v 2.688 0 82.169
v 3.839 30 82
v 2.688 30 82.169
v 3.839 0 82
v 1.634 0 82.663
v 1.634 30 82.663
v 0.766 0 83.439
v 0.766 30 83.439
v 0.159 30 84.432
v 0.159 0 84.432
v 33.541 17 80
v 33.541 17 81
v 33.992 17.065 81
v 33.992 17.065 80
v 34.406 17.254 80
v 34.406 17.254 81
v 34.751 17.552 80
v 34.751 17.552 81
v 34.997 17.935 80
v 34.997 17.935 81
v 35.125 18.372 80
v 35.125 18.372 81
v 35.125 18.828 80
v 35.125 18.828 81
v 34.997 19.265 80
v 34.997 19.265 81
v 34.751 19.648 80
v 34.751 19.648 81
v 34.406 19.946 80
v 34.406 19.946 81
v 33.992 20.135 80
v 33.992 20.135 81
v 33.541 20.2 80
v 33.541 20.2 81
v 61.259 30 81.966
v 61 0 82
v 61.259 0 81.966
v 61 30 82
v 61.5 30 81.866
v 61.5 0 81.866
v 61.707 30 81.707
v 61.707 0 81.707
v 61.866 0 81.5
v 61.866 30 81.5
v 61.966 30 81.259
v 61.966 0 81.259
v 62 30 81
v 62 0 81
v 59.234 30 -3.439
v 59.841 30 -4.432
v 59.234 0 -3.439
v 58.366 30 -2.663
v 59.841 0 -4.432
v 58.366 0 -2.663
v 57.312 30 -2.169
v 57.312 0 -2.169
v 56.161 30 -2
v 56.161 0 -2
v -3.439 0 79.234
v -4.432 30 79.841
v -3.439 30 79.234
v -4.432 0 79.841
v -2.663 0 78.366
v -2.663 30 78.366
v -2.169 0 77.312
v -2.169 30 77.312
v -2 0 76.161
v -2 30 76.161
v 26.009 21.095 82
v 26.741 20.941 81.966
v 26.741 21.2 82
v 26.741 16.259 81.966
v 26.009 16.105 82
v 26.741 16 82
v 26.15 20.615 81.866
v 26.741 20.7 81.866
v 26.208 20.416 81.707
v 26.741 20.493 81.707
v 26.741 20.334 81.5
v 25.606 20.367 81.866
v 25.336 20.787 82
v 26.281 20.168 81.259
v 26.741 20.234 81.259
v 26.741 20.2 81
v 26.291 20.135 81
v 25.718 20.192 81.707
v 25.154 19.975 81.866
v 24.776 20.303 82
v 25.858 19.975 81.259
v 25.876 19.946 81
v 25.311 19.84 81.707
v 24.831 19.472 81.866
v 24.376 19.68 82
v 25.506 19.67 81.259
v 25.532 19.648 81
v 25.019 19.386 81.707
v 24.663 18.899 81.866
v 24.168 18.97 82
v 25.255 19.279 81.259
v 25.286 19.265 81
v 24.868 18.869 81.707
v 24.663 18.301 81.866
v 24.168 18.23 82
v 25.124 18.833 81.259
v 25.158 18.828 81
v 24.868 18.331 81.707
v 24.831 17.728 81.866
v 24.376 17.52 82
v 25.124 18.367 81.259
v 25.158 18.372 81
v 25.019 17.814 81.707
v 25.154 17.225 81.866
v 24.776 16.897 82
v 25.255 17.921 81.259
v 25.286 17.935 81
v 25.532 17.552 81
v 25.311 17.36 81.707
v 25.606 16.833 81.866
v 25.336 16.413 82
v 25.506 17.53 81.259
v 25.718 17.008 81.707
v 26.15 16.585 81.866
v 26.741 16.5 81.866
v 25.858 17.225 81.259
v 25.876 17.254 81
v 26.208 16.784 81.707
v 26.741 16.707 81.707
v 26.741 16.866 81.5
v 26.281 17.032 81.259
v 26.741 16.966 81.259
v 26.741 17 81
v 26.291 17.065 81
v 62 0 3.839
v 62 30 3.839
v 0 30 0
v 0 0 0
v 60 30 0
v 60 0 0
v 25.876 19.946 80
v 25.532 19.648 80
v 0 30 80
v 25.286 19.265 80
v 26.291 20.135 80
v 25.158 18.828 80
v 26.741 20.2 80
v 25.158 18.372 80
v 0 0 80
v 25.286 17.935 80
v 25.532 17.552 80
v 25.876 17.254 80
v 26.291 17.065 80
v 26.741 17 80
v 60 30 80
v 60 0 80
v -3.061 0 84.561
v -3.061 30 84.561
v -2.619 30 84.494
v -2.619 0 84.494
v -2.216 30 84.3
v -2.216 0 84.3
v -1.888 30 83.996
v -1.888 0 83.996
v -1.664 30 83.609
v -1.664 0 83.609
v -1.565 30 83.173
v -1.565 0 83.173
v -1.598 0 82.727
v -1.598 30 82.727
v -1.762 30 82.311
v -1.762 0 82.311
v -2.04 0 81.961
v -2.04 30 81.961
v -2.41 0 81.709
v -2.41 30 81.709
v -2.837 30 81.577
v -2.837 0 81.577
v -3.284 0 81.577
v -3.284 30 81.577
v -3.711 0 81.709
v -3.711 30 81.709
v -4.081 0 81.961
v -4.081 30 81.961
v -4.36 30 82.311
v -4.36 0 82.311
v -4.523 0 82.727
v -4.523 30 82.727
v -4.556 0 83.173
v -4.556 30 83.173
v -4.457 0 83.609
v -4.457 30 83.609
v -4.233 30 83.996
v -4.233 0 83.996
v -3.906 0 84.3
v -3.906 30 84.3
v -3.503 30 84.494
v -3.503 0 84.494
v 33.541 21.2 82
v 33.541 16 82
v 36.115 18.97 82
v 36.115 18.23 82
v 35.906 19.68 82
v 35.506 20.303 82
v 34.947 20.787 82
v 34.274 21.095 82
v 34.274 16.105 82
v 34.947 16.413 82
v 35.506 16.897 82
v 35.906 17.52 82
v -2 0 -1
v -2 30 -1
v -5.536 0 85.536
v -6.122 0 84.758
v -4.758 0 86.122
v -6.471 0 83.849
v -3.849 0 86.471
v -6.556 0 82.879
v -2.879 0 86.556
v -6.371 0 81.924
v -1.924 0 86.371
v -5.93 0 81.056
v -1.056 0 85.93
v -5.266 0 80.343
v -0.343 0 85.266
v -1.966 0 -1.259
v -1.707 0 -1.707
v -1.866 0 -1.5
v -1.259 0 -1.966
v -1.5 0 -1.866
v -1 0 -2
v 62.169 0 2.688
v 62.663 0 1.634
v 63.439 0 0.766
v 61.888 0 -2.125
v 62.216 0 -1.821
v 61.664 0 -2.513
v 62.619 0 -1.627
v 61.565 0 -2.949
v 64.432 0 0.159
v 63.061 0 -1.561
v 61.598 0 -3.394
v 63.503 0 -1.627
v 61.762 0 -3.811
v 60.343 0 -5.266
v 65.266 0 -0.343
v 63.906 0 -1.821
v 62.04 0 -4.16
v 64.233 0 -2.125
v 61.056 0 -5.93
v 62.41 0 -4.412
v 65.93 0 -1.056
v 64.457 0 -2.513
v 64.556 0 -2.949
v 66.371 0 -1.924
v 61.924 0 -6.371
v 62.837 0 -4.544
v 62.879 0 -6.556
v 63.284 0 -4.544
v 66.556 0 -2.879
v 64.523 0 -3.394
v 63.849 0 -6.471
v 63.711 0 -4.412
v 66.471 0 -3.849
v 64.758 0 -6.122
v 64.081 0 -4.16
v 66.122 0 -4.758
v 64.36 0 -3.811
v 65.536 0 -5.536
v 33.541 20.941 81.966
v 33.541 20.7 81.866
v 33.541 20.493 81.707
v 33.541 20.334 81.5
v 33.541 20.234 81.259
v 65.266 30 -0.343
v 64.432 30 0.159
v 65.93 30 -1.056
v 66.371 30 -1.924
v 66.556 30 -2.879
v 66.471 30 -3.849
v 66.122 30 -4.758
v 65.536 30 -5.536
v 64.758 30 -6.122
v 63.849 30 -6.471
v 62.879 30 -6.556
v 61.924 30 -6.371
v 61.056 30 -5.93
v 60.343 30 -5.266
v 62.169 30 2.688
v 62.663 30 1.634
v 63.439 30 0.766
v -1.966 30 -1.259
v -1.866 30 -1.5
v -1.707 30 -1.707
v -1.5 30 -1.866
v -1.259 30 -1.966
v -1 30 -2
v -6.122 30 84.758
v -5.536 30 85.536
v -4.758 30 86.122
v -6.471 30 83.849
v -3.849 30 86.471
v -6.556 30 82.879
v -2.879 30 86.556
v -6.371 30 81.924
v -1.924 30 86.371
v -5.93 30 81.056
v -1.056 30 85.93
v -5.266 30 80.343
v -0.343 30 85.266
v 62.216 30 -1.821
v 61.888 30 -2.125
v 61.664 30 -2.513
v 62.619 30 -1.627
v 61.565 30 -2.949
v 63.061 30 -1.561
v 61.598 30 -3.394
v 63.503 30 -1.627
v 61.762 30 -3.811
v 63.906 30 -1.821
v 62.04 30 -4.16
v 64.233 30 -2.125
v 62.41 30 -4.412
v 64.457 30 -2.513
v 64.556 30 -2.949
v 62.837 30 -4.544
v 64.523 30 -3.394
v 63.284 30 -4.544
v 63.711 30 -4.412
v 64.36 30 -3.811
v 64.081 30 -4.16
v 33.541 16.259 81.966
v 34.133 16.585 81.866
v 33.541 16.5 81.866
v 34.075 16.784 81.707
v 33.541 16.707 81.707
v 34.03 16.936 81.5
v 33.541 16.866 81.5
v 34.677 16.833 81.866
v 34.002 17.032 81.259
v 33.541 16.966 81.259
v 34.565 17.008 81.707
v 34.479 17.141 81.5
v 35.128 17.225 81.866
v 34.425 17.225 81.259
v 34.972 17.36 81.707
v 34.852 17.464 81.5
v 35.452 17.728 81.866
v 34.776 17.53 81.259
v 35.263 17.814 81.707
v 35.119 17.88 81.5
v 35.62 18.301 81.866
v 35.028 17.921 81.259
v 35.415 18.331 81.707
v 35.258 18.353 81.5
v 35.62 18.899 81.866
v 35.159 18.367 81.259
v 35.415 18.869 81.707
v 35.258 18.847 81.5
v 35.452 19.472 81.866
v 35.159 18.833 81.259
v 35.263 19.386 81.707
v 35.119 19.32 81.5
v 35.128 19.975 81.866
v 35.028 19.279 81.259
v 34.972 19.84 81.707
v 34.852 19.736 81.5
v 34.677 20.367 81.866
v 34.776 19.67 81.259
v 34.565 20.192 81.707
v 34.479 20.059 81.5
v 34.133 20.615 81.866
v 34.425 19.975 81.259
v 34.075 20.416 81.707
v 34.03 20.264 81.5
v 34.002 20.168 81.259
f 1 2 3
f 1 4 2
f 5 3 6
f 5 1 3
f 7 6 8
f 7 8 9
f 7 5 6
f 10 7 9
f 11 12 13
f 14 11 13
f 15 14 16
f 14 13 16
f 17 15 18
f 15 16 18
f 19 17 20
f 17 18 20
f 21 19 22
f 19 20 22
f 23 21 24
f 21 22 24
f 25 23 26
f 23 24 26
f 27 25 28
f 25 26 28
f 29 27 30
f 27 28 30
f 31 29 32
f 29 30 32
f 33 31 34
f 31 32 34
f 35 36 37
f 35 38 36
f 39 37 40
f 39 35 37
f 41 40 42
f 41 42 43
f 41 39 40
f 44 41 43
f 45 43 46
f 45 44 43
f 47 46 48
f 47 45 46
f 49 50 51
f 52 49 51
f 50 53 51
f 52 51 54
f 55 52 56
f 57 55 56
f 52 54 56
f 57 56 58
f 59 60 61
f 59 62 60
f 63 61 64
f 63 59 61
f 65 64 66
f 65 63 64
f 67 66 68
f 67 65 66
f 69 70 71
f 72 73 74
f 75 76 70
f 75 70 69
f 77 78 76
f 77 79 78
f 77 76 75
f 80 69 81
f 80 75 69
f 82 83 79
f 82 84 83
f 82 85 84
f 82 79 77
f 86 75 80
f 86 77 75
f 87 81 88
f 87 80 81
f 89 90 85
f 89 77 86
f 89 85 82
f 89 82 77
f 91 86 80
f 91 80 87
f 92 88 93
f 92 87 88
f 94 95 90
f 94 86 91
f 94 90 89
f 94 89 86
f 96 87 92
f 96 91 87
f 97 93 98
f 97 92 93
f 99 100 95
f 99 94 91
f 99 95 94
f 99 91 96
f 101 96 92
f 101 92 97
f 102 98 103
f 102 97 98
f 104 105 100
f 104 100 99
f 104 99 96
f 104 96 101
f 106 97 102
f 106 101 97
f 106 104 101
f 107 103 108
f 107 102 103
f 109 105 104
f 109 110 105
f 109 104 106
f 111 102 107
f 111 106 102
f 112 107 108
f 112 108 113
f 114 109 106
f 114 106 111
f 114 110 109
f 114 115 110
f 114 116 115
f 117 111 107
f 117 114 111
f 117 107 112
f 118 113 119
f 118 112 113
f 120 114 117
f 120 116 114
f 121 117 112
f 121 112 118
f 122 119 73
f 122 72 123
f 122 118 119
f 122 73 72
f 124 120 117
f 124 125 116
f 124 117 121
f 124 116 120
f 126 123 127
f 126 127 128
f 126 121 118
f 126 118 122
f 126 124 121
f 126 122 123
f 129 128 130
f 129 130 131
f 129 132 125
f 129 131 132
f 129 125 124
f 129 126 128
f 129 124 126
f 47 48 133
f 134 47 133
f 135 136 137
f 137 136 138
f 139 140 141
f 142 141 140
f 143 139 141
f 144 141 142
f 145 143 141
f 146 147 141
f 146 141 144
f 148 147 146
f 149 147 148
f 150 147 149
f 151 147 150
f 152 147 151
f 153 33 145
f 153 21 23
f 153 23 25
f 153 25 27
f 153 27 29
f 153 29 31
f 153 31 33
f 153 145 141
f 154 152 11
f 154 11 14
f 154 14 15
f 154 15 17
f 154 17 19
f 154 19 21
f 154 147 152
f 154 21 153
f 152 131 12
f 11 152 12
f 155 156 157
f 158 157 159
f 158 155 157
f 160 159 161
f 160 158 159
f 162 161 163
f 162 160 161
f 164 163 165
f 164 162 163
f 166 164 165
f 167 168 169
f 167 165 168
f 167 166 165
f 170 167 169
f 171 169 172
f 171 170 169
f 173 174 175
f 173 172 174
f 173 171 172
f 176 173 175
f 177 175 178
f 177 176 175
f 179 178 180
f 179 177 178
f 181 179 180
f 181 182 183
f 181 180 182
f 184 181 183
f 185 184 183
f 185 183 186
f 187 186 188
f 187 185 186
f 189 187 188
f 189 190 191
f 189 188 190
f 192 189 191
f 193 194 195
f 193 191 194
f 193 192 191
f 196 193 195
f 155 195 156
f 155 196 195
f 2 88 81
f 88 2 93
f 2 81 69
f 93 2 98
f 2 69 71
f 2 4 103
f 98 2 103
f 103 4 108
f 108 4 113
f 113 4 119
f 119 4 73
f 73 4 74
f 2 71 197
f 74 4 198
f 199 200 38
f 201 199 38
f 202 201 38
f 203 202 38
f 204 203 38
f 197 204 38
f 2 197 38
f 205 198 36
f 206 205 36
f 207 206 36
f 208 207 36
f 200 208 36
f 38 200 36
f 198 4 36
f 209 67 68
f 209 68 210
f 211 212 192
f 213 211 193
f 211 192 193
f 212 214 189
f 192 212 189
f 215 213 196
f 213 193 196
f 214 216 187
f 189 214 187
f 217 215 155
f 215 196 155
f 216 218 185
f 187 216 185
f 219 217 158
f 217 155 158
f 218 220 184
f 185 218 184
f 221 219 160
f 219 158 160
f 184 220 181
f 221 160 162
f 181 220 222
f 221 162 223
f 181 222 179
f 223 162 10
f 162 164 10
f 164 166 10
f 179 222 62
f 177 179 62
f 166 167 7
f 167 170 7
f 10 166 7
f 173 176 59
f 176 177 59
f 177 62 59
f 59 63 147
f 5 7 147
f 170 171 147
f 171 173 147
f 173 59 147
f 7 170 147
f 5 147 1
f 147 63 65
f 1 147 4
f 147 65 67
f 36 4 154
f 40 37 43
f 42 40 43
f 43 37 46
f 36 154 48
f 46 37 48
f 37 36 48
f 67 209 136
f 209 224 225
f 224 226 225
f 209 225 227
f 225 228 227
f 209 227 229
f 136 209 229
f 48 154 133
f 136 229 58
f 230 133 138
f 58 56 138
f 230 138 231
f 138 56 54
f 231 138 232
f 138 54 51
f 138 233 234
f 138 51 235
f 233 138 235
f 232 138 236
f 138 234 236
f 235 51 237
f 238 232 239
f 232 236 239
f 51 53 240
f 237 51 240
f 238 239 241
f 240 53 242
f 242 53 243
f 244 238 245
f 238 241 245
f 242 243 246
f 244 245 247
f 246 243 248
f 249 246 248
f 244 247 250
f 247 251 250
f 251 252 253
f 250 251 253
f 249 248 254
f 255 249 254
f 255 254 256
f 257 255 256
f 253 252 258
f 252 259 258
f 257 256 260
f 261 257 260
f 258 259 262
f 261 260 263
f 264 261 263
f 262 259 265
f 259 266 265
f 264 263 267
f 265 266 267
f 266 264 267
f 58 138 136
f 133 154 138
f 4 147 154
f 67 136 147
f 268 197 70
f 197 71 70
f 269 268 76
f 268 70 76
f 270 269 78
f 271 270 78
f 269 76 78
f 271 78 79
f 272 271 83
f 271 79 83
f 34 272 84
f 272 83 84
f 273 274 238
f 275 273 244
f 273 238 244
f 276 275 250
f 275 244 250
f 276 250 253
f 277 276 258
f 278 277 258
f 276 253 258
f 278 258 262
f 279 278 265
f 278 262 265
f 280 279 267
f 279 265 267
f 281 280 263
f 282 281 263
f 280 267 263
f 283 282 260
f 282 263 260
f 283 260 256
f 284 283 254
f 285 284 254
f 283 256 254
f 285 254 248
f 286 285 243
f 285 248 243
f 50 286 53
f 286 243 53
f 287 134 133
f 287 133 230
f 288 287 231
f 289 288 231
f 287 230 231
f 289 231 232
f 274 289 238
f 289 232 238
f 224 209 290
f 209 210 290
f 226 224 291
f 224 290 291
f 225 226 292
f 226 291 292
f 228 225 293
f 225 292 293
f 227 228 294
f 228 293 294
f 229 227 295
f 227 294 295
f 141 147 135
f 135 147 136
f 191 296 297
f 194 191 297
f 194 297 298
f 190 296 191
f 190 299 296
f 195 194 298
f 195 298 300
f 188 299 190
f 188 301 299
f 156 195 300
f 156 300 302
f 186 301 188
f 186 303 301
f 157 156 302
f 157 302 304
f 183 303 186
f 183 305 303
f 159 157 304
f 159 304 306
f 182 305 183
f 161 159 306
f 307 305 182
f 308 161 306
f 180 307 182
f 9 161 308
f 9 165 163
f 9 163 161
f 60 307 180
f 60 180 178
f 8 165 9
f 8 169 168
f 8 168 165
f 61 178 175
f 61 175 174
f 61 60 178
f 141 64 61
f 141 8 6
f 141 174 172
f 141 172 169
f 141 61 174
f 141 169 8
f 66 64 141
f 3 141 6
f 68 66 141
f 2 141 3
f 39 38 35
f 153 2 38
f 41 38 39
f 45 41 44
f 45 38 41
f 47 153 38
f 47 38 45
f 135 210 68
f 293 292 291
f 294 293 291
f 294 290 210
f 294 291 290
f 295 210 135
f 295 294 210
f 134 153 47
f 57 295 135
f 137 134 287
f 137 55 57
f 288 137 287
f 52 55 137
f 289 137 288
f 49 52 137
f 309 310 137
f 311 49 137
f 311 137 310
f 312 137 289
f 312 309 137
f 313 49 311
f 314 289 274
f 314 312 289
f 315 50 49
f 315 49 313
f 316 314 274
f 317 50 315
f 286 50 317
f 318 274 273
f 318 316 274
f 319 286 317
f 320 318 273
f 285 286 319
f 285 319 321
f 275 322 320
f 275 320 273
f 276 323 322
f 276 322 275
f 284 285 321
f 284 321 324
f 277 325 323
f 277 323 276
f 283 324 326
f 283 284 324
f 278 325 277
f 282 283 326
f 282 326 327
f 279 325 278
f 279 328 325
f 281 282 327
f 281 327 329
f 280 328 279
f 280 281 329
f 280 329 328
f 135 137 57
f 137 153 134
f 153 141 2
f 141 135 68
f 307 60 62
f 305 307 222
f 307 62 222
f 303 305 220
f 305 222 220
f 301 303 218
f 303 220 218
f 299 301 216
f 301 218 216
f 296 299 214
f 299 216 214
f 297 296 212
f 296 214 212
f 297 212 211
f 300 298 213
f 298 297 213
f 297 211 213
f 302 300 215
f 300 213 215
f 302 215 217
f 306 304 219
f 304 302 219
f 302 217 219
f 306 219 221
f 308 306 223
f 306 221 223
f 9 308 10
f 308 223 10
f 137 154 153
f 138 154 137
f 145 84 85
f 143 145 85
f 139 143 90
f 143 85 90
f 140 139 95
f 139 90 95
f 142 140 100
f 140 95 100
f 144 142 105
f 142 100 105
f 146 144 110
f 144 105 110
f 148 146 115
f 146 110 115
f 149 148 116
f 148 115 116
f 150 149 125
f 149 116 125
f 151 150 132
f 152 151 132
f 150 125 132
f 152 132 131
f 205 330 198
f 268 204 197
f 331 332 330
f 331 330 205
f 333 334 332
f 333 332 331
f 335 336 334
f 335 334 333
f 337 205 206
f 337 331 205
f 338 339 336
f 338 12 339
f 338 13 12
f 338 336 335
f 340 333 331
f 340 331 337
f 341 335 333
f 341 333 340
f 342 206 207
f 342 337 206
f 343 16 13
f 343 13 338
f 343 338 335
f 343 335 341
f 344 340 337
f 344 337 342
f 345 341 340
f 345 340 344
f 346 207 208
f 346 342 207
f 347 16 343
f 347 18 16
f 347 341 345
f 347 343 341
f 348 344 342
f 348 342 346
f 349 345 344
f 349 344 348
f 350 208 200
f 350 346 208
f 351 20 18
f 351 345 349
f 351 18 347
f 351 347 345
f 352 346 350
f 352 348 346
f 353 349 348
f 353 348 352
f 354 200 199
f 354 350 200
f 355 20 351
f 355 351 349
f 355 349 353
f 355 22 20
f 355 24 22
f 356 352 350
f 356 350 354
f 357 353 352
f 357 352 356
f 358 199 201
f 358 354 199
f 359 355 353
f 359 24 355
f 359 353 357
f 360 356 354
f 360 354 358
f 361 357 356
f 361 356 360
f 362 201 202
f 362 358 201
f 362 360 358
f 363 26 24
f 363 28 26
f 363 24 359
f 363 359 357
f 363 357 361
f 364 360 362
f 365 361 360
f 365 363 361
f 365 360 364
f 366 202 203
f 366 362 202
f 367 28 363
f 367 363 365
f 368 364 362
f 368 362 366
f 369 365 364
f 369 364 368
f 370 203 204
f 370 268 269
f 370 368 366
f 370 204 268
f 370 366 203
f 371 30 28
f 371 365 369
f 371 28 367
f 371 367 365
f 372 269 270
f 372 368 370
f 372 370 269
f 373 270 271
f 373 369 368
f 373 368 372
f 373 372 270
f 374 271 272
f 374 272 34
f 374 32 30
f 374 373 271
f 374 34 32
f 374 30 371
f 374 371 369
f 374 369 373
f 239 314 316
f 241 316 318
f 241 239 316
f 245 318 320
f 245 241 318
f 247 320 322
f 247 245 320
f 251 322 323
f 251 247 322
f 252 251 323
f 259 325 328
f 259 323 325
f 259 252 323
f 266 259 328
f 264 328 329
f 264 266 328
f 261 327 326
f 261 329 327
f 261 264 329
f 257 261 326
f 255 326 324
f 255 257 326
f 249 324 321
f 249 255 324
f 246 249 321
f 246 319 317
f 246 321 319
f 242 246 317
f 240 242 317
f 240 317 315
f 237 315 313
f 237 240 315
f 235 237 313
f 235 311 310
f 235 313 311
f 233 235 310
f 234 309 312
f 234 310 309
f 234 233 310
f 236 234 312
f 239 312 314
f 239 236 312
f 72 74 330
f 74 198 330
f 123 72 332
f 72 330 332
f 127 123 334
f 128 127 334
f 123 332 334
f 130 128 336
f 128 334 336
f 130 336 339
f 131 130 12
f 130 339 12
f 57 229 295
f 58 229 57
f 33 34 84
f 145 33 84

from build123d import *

# Parameters (mm, degrees)
SKETCH1_W           = 64
SKETCH1_H           = 84
SKETCH1_W_2         = 60
SKETCH1_H_2         = 80
BOSS_EXTRUDE1_DEPTH = 30
SKETCH2_R           = 3.5
SKETCH2_R_2         = 1.5
BOSS_EXTRUDE2_DEPTH = 30
CUT_EXTRUDE1_DEPTH  = 30
FILLET2_R           = 1
FILLET3_R           = 4
FILLET4_R           = 1


with BuildPart() as part:
    # Sketch1 → Boss-Extrude1 (new body)
    with BuildSketch(Plane(origin=(0, 0, 0), x_dir=(1, 0, 0), z_dir=(0, 1, 0))):
        with Locations((30, -40)):
            Rectangle(SKETCH1_W, SKETCH1_H)
        with Locations((30, -40)):
            Rectangle(SKETCH1_W_2, SKETCH1_H_2, mode=Mode.SUBTRACT)
    extrude(amount=BOSS_EXTRUDE1_DEPTH)

    # Sketch2 → Boss-Extrude2 (add)
    # profile 1 of 2: a face of its own
    with BuildSketch(Plane(origin=(0, 0, 0), x_dir=(1, 0, 0), z_dir=(0, 1, 0))):
        with Locations((-3.060660172, -83.060660172)):
            Circle(SKETCH2_R)
        with Locations(Location((-3.060660172, -83.060660172, 0), (0, 0, 270))):
            Circle(SKETCH2_R_2, mode=Mode.SUBTRACT)
    # profile 2 of 2: a face of its own
    with BuildSketch(Plane(origin=(0, 0, 0), x_dir=(1, 0, 0), z_dir=(0, 1, 0))):
        with Locations((63.060660172, 3.060660172)):
            Circle(SKETCH2_R)
        with Locations(Location((63.060660172, 3.060660172, 0), (0, 0, 270))):
            Circle(SKETCH2_R_2, mode=Mode.SUBTRACT)
    extrude(amount=BOSS_EXTRUDE2_DEPTH)

    # Sketch4 → Cut-Extrude1 (cut)
    with BuildSketch(Plane.XY.offset(82)):
        with BuildLine():
            Line((30.141314867, 20.2), (26.741314867, 20.2))
            ThreePointArc((26.741314867, 20.2), (25.141314867, 18.6), (26.741314867, 17))
            Line((26.741314867, 17), (30.141314867, 17))
            Line((30.141314867, 17), (33.541314867, 17))
            ThreePointArc((33.541314867, 17), (35.141314867, 18.6), (33.541314867, 20.2))
            Line((33.541314867, 20.2), (30.141314867, 20.2))
        make_face()
    extrude(amount=-CUT_EXTRUDE1_DEPTH, mode=Mode.SUBTRACT)

    # Fillet2
    fillet2_edges = [part.edges().sort_by_distance(p)[0] for p in [
        (30.141314867, 17, 82),
        (35.141314867, 18.6, 82),
        (30.141314867, 20.2, 82),
        (25.141314867, 18.6, 82),
    ]]
    fillet(fillet2_edges, radius=FILLET2_R)

    # Fillet3
    fillet3_edges = [part.edges().sort_by_distance(p)[0] for p in [
        (-2, 15, 79.725244156),
        (59.725244156, 15, -2),
        (0.274755844, 15, 82),
        (62, 15, 0.274755844),
    ]]
    fillet(fillet3_edges, radius=FILLET3_R)

    # Fillet4
    fillet4_edges = [part.edges().sort_by_distance(p)[0] for p in [
        (-2, 15, -2),
        (62, 15, 82),
    ]]
    fillet(fillet4_edges, radius=FILLET4_R)


solid = part.part
